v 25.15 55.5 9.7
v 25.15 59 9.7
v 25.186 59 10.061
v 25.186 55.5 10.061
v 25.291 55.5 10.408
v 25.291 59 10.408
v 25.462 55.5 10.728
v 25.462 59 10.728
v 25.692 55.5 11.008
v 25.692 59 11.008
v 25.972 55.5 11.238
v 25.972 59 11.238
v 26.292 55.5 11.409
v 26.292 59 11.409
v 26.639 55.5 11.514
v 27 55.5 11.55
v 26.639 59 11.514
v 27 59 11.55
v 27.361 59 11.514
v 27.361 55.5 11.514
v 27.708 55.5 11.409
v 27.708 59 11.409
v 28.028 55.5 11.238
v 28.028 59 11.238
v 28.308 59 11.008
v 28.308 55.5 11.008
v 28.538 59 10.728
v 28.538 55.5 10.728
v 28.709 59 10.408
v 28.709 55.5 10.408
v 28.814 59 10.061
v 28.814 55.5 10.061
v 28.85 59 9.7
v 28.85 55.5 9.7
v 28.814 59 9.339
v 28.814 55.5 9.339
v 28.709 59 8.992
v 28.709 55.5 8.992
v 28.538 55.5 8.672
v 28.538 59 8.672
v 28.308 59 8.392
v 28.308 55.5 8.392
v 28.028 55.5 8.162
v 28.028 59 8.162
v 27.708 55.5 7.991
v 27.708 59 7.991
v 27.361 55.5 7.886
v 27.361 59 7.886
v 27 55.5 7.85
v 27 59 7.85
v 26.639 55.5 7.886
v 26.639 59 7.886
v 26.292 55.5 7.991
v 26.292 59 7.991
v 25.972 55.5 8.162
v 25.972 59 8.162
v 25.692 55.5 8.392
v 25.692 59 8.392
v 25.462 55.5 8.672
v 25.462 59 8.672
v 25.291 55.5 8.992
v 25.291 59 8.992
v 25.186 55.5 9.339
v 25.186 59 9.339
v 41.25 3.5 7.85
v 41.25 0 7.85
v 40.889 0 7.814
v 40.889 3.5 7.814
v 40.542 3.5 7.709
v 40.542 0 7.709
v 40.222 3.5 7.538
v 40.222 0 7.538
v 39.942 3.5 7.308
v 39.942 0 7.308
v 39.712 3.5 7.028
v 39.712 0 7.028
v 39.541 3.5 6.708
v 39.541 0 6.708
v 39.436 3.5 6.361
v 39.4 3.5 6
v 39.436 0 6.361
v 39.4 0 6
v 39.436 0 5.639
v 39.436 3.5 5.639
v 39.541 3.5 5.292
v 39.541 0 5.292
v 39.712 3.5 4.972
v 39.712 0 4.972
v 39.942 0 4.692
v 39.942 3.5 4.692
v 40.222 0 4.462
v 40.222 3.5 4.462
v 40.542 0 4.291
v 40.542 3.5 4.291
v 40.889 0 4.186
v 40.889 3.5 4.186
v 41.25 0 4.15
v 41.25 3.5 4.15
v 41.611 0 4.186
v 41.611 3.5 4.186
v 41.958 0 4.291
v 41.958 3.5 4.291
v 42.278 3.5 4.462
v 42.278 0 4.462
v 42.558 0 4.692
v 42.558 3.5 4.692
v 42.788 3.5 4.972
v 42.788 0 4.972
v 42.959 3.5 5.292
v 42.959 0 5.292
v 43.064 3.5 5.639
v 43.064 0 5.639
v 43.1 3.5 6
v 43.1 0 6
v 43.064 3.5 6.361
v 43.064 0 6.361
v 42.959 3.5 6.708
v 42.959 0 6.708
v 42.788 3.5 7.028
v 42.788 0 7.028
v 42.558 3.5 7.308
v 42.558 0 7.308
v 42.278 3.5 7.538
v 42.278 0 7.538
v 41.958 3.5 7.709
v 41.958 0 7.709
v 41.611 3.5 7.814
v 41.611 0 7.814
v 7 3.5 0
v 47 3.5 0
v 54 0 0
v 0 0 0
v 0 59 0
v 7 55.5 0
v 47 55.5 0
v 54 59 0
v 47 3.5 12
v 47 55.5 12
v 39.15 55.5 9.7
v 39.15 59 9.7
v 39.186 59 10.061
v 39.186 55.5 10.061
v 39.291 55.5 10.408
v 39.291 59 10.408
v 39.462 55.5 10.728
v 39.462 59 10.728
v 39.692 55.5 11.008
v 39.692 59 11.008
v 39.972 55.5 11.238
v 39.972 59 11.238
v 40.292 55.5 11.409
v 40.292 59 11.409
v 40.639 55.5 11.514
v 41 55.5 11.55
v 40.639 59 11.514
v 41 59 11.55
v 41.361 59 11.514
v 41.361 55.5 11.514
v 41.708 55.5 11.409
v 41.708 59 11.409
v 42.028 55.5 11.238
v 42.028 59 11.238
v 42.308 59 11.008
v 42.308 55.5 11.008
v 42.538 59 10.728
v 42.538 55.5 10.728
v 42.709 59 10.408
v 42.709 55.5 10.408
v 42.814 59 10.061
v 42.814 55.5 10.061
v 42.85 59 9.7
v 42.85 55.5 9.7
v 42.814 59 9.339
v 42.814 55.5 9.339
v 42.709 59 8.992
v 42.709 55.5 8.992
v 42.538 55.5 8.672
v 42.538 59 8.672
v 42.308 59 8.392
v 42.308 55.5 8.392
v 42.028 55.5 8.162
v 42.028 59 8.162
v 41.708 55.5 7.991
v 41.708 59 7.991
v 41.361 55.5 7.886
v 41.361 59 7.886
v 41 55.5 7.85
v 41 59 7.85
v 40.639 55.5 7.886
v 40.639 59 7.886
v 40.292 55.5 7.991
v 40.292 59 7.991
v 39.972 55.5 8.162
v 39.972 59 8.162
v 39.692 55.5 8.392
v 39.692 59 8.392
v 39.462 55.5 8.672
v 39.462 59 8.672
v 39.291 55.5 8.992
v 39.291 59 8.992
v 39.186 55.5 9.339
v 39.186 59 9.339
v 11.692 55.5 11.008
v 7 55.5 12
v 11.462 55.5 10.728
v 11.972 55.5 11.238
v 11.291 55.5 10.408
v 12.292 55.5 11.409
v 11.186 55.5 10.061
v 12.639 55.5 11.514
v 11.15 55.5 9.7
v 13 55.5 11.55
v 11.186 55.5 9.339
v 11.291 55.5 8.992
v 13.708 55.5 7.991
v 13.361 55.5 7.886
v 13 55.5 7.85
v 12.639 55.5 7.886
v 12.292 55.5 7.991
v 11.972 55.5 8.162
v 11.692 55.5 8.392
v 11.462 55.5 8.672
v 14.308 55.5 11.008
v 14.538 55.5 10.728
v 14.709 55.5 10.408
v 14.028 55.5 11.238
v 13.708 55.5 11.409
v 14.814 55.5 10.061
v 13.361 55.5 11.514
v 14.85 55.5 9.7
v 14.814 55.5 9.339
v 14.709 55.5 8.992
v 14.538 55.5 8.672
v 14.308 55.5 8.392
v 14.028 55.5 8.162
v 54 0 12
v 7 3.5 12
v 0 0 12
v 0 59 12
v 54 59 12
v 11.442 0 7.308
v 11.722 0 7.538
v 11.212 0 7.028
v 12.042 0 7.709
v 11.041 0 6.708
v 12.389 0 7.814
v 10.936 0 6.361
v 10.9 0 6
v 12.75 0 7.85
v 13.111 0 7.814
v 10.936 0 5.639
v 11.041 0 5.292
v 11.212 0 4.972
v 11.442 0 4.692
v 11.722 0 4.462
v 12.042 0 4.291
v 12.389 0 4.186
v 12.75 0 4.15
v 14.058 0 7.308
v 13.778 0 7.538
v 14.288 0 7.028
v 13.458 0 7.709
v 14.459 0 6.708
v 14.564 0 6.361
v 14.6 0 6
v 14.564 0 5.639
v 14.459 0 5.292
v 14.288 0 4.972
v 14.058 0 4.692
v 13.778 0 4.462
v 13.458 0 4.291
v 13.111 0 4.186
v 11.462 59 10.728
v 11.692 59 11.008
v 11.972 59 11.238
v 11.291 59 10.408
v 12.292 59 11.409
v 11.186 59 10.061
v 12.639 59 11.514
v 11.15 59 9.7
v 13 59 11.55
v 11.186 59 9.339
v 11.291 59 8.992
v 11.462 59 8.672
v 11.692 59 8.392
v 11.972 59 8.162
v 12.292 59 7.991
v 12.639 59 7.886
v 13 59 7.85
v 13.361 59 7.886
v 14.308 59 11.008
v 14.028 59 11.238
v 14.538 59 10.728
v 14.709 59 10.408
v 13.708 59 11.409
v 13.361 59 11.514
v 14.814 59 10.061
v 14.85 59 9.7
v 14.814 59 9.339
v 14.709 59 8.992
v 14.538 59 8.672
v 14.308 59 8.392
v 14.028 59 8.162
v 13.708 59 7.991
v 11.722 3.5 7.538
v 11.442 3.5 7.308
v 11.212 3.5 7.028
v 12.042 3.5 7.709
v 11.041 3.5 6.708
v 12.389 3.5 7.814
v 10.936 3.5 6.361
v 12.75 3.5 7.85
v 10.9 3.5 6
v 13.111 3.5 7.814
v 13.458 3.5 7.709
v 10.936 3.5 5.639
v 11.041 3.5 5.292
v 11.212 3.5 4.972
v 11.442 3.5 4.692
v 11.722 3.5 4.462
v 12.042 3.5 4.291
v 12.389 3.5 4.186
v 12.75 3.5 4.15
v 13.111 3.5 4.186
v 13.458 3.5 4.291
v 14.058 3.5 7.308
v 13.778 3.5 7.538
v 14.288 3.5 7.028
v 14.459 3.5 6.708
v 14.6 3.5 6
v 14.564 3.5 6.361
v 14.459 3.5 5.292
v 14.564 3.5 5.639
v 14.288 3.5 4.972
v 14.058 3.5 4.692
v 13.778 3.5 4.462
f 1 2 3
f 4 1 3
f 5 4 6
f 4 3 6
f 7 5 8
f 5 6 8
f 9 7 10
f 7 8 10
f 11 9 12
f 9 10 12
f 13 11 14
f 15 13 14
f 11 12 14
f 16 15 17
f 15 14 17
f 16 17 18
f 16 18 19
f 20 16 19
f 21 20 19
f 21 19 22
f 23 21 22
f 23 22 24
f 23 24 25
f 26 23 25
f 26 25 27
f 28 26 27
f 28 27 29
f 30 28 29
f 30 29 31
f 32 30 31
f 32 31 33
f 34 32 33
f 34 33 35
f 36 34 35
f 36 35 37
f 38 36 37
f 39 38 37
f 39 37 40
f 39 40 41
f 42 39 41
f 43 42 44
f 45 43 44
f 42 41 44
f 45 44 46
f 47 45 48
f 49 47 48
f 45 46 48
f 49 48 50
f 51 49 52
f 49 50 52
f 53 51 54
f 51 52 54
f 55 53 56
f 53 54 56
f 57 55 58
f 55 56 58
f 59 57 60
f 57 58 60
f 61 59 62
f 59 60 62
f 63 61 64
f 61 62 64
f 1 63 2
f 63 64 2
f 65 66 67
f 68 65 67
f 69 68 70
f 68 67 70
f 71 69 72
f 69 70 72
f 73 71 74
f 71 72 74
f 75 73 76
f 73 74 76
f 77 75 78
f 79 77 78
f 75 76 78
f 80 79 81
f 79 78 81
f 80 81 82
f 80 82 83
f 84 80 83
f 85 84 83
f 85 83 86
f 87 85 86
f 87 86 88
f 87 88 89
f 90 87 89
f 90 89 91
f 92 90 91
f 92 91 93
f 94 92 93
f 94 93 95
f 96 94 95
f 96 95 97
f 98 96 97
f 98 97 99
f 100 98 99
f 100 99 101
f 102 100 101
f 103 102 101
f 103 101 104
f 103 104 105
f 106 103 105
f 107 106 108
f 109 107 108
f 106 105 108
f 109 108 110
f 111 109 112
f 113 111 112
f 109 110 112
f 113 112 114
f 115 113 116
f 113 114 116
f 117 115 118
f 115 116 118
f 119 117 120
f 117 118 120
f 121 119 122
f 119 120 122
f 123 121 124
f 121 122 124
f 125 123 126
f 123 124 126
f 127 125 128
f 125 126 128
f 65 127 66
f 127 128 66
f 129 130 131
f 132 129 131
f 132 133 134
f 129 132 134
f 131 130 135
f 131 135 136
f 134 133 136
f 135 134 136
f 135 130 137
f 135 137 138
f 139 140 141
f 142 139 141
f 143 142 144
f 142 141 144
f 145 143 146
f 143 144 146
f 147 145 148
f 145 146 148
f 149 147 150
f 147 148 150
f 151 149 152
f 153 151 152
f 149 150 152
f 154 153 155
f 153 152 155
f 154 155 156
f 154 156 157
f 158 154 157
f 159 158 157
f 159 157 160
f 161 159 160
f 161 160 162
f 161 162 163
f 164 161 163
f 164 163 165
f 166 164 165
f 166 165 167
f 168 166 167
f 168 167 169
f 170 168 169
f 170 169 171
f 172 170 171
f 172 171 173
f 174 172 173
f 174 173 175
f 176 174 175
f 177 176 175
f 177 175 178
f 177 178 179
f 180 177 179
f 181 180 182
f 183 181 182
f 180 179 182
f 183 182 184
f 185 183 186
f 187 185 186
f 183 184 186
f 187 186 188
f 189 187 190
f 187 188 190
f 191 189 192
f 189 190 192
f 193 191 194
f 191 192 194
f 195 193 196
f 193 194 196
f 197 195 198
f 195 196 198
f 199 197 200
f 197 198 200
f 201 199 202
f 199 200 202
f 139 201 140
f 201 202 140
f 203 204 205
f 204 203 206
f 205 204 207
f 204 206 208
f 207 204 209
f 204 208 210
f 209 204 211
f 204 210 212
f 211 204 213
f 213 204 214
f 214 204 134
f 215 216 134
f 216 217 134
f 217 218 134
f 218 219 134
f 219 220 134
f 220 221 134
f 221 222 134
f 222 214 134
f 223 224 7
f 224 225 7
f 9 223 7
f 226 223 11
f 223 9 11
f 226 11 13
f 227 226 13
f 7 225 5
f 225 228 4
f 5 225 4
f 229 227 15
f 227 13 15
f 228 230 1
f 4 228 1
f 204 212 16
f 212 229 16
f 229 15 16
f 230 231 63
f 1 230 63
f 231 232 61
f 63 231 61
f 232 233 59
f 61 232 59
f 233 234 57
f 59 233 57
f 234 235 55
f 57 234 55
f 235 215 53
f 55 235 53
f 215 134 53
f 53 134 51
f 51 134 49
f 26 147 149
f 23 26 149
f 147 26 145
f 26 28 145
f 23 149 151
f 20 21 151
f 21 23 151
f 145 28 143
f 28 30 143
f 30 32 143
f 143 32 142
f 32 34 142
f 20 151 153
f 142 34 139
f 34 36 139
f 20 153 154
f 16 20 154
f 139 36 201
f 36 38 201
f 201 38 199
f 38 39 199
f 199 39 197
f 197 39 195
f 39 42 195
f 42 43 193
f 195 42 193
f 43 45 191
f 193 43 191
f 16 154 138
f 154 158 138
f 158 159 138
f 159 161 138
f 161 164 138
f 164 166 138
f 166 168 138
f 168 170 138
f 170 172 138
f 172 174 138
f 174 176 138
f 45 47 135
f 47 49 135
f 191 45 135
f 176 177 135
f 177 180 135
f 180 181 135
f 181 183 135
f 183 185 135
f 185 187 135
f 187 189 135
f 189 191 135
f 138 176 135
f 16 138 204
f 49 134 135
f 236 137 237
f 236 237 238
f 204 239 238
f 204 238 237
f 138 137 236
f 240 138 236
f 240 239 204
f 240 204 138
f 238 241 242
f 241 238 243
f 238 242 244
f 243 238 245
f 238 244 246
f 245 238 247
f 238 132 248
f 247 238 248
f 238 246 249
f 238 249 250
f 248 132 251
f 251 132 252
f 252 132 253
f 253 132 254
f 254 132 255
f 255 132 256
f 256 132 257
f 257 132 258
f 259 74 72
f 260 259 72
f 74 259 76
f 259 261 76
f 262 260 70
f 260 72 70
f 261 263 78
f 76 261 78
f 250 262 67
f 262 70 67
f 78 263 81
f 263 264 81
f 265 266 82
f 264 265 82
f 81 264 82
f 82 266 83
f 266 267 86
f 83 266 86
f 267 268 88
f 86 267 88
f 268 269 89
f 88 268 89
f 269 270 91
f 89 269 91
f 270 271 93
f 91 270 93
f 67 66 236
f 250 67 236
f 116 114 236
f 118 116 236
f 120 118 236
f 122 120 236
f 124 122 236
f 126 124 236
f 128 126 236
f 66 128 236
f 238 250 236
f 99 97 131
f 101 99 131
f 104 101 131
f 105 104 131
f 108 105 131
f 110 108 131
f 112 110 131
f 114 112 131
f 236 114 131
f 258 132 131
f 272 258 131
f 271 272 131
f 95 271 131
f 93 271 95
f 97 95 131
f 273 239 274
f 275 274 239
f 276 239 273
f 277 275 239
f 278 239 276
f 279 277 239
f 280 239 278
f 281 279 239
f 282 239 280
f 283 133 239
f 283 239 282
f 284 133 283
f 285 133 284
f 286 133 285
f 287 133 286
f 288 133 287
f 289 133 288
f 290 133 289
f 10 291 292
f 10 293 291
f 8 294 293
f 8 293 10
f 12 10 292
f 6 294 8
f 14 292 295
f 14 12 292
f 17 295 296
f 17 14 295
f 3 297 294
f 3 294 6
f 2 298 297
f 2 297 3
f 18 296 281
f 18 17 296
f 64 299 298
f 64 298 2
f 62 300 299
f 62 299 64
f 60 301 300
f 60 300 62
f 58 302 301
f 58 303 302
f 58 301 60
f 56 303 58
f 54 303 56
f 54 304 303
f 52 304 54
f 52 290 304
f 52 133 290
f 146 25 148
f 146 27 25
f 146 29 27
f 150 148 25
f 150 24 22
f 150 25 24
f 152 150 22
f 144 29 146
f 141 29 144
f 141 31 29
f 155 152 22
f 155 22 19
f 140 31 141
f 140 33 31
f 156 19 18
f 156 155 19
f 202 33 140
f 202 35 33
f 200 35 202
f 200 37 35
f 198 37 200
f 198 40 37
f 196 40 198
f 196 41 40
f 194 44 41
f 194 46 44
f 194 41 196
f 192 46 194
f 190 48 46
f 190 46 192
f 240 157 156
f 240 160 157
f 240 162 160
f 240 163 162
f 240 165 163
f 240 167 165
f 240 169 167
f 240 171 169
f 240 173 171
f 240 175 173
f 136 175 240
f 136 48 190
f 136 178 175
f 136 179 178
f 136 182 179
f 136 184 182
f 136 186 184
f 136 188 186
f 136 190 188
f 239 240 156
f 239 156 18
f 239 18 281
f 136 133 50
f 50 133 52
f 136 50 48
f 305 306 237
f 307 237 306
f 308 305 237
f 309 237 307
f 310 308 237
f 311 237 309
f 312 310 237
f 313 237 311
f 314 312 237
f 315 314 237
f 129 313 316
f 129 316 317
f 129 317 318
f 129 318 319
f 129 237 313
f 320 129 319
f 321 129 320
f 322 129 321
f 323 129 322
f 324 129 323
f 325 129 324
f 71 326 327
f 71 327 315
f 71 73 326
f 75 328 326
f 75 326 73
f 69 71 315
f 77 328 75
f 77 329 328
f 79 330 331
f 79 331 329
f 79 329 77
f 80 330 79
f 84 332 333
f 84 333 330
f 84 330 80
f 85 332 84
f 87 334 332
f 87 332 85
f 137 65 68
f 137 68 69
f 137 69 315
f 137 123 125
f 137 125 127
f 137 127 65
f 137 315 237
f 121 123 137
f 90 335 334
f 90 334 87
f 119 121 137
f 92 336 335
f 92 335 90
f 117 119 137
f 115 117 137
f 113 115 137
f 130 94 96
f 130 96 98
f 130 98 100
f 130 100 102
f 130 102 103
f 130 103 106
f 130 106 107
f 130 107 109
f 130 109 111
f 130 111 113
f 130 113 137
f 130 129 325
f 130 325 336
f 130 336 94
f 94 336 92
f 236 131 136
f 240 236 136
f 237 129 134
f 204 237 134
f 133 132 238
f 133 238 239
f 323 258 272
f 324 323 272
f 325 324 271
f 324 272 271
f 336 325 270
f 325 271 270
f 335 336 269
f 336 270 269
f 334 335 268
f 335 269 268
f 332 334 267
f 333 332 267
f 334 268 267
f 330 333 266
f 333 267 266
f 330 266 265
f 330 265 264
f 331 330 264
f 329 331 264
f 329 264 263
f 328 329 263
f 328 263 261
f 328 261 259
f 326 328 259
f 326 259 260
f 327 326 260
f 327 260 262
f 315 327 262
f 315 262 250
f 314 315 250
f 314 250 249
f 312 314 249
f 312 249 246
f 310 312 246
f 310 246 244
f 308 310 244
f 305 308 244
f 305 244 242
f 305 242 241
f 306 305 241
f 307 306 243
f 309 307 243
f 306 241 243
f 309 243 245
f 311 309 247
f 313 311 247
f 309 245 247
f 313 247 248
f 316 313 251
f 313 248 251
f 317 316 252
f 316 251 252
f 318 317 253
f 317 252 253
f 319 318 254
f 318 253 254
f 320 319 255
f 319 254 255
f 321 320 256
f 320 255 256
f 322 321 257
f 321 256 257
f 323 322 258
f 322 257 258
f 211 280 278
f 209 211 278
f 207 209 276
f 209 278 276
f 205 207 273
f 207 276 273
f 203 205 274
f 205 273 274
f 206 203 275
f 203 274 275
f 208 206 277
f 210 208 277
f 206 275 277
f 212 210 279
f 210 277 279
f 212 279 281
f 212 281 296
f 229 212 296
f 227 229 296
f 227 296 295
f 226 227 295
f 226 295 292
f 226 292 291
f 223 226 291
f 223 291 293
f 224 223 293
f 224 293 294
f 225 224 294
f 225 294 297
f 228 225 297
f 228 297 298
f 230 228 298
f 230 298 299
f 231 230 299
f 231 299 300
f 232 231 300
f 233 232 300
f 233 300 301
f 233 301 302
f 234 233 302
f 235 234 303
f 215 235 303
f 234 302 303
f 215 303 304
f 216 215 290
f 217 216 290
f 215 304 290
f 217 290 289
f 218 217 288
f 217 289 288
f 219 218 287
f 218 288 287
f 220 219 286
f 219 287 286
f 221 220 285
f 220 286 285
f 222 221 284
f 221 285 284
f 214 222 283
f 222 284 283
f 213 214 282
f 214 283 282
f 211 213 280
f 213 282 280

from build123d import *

# Parameters (mm, degrees)
SKETCH1_W           = 54
SKETCH1_H           = 59
SKETCH1_W_2         = 40
SKETCH1_H_2         = 52
BOSS_EXTRUDE1_DEPTH = 12
SKETCH2_R           = 1.85
CUT_EXTRUDE1_DEPTH  = 10
SKETCH3_R           = 1.85
CUT_EXTRUDE2_DEPTH  = 10


with BuildPart() as part:
    # Sketch1 → Boss-Extrude1 (new body)
    with BuildSketch(Plane.XY):
        with Locations((27, 29.5)):
            Rectangle(SKETCH1_W, SKETCH1_H)
        with Locations((27, 29.5)):
            Rectangle(SKETCH1_W_2, SKETCH1_H_2, mode=Mode.SUBTRACT)
    extrude(amount=BOSS_EXTRUDE1_DEPTH)

    # Sketch2 → Cut-Extrude1 (cut)
    with BuildSketch(Plane(origin=(0, 59, 0), x_dir=(1, 0, 0), z_dir=(0, 1, 0))):
        with Locations(Location((13, -9.7, 0), (0, 0, 180))):
            Circle(SKETCH2_R)
        with Locations(Location((41, -9.7, 0), (0, 0, 180))):
            Circle(SKETCH2_R)
        with Locations(Location((27, -9.7, 0), (0, 0, 180))):
            Circle(SKETCH2_R)
    extrude(amount=-CUT_EXTRUDE1_DEPTH, mode=Mode.SUBTRACT)

    # Sketch3 → Cut-Extrude2 (cut)
    with BuildSketch(Plane.XZ):
        with Locations(Location((12.75, 6, 0), (0, 0, 270))):
            Circle(SKETCH3_R)
        with Locations(Location((41.25, 6, 0), (0, 0, 90))):
            Circle(SKETCH3_R)
    extrude(amount=-CUT_EXTRUDE2_DEPTH, mode=Mode.SUBTRACT)


solid = part.part
